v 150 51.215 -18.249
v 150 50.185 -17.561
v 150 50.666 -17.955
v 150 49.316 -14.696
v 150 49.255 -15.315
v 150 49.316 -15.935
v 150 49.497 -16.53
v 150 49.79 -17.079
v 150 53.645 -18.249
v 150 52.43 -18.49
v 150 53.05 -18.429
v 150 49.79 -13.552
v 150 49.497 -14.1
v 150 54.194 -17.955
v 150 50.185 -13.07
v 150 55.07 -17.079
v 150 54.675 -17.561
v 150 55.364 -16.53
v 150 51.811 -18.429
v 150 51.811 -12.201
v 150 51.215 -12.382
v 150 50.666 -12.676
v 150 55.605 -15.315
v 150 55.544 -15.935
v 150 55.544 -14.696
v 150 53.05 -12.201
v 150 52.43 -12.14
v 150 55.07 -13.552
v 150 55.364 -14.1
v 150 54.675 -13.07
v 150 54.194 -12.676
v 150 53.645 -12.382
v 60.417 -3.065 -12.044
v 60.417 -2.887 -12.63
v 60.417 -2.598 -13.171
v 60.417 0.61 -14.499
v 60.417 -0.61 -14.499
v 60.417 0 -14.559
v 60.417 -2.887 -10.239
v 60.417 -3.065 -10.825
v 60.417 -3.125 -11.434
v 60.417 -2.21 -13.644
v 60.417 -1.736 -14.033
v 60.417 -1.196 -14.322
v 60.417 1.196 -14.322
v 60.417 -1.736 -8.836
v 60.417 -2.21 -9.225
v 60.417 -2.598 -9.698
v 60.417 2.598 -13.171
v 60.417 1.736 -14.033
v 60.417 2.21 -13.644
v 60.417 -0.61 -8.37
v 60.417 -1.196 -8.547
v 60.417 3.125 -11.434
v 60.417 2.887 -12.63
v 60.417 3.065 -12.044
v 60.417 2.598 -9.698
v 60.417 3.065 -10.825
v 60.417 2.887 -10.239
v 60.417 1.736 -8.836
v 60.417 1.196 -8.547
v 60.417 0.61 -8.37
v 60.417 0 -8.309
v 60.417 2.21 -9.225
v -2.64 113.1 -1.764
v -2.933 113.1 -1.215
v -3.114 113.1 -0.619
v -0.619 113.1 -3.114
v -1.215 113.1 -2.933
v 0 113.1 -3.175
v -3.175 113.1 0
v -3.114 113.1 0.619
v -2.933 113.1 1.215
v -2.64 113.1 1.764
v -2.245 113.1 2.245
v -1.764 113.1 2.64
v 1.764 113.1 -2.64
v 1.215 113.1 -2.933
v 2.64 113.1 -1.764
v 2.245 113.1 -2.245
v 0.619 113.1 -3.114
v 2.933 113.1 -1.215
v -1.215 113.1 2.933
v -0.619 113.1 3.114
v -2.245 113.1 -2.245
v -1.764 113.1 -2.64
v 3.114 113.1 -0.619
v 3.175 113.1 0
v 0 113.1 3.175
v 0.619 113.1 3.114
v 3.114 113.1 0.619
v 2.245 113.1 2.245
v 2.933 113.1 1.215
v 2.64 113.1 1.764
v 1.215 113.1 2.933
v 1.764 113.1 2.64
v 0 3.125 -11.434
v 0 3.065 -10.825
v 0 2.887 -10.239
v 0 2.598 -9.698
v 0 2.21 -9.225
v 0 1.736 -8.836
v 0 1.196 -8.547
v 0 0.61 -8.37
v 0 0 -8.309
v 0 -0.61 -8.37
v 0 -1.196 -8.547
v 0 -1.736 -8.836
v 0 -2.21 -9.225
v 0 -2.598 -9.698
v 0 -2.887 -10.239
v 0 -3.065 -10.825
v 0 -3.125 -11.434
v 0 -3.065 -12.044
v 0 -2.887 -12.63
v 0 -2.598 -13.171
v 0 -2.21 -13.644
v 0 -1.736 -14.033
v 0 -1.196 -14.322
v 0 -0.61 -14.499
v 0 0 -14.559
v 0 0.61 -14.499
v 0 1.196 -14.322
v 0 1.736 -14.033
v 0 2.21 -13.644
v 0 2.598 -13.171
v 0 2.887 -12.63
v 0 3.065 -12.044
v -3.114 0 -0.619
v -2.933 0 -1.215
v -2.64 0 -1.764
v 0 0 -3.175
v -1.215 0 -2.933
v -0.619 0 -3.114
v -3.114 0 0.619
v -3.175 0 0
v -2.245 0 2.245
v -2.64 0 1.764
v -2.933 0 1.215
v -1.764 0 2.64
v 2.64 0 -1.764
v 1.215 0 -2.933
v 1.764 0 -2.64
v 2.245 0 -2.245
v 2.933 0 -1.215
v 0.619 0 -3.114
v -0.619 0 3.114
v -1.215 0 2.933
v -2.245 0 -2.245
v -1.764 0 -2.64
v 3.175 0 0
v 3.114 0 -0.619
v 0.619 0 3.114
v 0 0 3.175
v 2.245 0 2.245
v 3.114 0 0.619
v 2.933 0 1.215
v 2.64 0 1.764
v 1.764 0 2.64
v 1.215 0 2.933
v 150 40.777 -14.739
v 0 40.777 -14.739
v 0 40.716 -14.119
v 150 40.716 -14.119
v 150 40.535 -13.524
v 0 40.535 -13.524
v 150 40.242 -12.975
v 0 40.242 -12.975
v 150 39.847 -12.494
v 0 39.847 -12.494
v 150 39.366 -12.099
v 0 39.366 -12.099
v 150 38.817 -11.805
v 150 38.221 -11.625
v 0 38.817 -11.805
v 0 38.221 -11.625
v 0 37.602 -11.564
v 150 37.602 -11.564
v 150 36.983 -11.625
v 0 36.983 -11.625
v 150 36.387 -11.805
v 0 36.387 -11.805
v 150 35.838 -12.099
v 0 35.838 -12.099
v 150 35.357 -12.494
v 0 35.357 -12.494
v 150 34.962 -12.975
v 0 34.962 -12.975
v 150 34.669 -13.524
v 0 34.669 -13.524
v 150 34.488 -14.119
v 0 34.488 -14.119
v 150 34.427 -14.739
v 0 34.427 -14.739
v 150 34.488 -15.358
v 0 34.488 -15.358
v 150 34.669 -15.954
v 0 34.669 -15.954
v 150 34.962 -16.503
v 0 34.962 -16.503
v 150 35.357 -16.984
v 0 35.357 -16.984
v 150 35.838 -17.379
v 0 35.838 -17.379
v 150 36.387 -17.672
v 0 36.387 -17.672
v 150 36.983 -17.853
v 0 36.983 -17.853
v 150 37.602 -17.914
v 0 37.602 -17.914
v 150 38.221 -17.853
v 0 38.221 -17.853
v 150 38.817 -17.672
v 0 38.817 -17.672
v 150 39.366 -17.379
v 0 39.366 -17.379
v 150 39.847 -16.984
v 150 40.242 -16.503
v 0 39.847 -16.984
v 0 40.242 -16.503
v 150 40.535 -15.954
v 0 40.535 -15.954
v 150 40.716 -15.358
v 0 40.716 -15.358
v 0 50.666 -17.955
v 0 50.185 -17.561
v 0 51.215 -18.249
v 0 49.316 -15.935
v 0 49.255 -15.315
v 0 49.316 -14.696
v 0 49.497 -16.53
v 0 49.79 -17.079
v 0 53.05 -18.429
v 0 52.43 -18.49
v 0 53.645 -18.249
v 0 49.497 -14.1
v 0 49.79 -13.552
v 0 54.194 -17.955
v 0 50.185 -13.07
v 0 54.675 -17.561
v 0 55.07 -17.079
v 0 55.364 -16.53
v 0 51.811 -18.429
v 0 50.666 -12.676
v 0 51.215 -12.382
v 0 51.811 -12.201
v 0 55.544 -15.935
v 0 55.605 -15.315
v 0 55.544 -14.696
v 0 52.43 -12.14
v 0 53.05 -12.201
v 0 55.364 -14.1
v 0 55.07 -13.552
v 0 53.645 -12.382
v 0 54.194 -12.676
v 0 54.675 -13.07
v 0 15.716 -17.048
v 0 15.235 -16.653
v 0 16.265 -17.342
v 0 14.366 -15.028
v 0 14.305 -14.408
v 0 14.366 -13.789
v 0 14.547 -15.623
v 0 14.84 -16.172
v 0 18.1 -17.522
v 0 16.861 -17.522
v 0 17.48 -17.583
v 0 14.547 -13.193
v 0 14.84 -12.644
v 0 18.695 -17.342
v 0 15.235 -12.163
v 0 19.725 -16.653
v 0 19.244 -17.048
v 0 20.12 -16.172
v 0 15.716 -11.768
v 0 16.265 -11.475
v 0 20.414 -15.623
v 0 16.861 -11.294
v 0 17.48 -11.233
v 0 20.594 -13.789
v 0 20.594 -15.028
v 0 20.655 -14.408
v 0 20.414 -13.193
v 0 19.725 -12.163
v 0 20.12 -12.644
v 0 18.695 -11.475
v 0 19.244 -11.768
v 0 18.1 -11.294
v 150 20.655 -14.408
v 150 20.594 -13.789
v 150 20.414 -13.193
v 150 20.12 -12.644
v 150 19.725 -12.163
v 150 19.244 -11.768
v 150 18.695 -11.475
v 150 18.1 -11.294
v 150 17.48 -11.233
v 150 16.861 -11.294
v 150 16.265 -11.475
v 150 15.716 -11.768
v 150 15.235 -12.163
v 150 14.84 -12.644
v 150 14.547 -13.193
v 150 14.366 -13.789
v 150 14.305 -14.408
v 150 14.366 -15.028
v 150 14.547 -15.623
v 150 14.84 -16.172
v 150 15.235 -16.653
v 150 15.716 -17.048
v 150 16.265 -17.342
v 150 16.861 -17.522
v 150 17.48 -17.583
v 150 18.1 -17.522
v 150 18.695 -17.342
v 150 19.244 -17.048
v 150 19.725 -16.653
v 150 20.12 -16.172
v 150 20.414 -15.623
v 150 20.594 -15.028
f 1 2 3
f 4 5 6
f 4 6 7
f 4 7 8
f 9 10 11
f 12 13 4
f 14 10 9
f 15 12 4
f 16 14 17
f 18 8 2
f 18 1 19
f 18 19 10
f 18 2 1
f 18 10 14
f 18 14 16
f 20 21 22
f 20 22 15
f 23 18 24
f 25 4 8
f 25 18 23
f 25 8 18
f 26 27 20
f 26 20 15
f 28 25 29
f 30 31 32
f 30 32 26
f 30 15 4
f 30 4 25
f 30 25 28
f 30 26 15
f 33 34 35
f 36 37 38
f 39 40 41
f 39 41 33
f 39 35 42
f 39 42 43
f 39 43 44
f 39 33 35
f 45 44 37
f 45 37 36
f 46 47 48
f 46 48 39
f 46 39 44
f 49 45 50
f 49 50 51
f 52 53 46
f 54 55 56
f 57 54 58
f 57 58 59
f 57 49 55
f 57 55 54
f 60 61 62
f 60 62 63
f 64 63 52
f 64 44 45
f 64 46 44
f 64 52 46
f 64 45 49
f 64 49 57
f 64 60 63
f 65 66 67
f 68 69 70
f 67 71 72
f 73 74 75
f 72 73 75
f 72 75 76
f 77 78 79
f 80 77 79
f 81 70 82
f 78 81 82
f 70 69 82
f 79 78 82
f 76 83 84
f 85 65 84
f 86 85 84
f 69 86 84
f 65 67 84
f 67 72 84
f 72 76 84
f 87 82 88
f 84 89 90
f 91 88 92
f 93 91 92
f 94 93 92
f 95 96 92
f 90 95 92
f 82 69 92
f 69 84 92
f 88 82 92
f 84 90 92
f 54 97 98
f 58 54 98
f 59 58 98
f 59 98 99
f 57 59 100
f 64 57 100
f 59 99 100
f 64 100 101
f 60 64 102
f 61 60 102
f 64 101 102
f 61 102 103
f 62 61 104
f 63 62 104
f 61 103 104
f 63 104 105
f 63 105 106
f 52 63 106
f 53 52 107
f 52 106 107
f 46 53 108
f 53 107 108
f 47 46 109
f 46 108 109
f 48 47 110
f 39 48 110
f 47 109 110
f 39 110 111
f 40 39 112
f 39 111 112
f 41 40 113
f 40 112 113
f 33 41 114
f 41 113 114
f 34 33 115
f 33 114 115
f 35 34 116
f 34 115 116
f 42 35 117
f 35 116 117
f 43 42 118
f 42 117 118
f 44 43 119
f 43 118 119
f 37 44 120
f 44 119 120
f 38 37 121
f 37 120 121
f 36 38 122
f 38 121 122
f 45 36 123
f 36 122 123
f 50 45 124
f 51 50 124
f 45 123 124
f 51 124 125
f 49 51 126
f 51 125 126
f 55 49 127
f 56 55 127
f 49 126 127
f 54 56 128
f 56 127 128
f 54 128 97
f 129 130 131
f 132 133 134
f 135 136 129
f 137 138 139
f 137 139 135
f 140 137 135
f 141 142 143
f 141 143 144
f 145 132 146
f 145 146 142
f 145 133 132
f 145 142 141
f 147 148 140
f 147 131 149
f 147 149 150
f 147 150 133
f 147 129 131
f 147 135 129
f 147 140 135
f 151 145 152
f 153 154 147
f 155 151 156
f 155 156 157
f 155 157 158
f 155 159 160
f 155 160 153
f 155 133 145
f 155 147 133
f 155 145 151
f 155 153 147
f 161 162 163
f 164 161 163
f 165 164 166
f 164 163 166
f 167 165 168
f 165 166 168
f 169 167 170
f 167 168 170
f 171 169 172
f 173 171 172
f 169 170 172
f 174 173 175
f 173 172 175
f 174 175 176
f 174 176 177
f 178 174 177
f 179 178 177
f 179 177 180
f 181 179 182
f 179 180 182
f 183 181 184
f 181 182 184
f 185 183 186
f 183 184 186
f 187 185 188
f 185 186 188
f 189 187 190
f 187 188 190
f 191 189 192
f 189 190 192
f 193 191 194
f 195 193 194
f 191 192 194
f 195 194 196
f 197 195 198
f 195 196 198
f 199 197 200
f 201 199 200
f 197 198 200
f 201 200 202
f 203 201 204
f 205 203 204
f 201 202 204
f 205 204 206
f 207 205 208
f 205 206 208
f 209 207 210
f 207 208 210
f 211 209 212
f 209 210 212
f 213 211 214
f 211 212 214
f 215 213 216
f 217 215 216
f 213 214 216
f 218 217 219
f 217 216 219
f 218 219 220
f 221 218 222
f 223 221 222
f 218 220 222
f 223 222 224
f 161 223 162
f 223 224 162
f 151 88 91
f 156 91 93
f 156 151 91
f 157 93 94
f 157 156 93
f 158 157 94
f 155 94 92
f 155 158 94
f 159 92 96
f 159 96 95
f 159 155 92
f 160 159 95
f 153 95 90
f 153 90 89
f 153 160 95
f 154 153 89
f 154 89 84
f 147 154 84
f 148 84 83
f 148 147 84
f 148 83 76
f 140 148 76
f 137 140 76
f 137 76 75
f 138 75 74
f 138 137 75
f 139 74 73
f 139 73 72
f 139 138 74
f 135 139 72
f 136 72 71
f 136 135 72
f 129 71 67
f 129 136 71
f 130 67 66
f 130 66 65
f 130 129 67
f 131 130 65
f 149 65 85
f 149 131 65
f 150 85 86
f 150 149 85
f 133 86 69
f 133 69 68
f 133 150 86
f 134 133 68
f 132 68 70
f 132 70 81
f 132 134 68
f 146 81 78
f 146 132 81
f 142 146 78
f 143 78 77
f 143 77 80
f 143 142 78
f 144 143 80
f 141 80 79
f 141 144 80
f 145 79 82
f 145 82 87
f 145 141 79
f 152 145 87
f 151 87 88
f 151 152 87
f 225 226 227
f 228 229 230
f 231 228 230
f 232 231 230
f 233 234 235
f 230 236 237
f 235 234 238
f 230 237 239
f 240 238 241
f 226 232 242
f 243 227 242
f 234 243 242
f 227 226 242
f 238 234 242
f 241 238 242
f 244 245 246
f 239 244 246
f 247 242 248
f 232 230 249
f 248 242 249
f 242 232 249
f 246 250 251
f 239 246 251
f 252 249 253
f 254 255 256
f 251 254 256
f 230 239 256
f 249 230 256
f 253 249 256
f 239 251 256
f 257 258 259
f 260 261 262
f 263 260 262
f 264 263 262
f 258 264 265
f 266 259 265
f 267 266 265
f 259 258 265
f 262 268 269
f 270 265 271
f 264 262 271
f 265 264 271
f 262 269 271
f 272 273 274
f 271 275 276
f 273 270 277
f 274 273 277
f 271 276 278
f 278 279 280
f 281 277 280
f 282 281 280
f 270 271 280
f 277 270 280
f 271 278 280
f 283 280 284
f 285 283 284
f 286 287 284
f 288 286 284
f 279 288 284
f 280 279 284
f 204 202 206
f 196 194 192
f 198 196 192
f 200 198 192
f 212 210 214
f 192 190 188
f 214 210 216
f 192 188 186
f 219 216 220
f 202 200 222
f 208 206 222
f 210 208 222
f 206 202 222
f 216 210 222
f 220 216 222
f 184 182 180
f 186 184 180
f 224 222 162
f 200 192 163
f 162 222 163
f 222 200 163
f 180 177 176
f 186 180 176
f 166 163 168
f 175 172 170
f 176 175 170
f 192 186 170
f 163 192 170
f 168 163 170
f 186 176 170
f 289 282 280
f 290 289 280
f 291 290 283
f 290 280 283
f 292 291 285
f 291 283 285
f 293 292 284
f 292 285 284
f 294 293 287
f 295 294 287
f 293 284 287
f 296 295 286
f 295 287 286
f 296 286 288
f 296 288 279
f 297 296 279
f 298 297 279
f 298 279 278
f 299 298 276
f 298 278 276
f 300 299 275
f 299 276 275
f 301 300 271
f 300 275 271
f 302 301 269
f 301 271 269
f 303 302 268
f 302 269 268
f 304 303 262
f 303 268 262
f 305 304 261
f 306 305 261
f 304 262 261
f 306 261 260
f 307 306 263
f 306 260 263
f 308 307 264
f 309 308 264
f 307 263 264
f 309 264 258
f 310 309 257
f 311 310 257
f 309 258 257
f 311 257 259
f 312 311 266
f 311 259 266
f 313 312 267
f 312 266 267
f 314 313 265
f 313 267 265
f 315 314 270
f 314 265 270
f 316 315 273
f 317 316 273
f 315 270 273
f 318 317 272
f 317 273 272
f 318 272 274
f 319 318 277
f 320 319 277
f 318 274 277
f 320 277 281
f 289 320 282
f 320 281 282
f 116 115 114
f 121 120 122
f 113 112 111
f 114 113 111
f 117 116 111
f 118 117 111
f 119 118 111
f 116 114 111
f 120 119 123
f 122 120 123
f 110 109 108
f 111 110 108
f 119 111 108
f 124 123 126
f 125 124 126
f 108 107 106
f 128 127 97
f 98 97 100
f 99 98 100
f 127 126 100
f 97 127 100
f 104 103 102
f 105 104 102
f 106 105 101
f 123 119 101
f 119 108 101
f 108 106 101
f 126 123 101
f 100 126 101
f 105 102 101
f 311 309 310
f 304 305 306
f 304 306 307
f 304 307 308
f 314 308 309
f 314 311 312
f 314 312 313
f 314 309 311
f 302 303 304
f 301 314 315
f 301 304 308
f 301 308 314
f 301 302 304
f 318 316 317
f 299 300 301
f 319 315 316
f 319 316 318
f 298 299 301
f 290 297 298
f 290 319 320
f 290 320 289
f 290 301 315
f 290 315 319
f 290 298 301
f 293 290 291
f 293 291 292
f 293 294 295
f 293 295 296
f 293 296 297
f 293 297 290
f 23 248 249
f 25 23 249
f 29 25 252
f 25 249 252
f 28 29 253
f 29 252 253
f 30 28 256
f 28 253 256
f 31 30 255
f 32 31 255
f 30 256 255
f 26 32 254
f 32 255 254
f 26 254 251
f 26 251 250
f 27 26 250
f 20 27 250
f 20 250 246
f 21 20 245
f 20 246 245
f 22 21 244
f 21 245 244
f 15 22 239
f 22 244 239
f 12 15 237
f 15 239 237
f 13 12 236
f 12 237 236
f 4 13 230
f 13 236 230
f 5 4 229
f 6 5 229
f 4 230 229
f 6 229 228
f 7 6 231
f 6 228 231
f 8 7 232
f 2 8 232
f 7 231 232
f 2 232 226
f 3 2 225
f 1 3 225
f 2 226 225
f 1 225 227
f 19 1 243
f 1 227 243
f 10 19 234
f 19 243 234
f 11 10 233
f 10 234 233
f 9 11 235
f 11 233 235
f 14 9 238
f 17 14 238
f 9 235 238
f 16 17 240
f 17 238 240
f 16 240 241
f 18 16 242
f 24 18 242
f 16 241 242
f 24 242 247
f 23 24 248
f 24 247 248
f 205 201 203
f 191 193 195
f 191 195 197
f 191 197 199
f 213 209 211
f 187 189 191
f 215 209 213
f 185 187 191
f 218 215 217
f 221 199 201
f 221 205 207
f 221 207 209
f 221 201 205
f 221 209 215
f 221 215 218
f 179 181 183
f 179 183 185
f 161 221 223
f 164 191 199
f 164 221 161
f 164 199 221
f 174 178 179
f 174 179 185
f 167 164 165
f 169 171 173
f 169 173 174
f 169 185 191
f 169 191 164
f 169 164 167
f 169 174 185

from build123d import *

# Parameters (mm, degrees)
F0_R     = 3.175
F1_DEPTH = 113.1
F2_R     = 3.125
F3_DEPTH = 60.41668
F4_R     = 3.175
F5_DEPTH = 150
F6_R     = 3.175
F7_DEPTH = 150
F8_R     = 3.175
F9_DEPTH = 150


with BuildPart() as f1:
    # F0 (on Front) → F1 (new body)
    with BuildSketch(Plane.XZ):
        Circle(F0_R)
    extrude(amount=-F1_DEPTH)


with BuildPart() as f3:
    # F2 (on Right) → F3 (new body)
    with BuildSketch(Plane.YZ):
        with Locations((0, -11.434477)):
            Circle(F2_R)
    extrude(amount=F3_DEPTH)


with BuildPart() as f5:
    # F4 (on Right) → F5 (new body)
    with BuildSketch(Plane.YZ):
        with Locations((17.480373, -14.408385)):
            Circle(F4_R)
    extrude(amount=F5_DEPTH)


with BuildPart() as f7:
    # F6 (on Right) → F7 (new body)
    with BuildSketch(Plane.YZ):
        with Locations((37.602078, -14.738738)):
            Circle(F6_R)
    extrude(amount=F7_DEPTH)


with BuildPart() as f9:
    # F8 (on Right) → F9 (new body)
    with BuildSketch(Plane.YZ):
        with Locations((52.430268, -15.315468)):
            Circle(F8_R)
    extrude(amount=F9_DEPTH)


solid = Compound([f1.part, f3.part, f5.part, f7.part, f9.part])
